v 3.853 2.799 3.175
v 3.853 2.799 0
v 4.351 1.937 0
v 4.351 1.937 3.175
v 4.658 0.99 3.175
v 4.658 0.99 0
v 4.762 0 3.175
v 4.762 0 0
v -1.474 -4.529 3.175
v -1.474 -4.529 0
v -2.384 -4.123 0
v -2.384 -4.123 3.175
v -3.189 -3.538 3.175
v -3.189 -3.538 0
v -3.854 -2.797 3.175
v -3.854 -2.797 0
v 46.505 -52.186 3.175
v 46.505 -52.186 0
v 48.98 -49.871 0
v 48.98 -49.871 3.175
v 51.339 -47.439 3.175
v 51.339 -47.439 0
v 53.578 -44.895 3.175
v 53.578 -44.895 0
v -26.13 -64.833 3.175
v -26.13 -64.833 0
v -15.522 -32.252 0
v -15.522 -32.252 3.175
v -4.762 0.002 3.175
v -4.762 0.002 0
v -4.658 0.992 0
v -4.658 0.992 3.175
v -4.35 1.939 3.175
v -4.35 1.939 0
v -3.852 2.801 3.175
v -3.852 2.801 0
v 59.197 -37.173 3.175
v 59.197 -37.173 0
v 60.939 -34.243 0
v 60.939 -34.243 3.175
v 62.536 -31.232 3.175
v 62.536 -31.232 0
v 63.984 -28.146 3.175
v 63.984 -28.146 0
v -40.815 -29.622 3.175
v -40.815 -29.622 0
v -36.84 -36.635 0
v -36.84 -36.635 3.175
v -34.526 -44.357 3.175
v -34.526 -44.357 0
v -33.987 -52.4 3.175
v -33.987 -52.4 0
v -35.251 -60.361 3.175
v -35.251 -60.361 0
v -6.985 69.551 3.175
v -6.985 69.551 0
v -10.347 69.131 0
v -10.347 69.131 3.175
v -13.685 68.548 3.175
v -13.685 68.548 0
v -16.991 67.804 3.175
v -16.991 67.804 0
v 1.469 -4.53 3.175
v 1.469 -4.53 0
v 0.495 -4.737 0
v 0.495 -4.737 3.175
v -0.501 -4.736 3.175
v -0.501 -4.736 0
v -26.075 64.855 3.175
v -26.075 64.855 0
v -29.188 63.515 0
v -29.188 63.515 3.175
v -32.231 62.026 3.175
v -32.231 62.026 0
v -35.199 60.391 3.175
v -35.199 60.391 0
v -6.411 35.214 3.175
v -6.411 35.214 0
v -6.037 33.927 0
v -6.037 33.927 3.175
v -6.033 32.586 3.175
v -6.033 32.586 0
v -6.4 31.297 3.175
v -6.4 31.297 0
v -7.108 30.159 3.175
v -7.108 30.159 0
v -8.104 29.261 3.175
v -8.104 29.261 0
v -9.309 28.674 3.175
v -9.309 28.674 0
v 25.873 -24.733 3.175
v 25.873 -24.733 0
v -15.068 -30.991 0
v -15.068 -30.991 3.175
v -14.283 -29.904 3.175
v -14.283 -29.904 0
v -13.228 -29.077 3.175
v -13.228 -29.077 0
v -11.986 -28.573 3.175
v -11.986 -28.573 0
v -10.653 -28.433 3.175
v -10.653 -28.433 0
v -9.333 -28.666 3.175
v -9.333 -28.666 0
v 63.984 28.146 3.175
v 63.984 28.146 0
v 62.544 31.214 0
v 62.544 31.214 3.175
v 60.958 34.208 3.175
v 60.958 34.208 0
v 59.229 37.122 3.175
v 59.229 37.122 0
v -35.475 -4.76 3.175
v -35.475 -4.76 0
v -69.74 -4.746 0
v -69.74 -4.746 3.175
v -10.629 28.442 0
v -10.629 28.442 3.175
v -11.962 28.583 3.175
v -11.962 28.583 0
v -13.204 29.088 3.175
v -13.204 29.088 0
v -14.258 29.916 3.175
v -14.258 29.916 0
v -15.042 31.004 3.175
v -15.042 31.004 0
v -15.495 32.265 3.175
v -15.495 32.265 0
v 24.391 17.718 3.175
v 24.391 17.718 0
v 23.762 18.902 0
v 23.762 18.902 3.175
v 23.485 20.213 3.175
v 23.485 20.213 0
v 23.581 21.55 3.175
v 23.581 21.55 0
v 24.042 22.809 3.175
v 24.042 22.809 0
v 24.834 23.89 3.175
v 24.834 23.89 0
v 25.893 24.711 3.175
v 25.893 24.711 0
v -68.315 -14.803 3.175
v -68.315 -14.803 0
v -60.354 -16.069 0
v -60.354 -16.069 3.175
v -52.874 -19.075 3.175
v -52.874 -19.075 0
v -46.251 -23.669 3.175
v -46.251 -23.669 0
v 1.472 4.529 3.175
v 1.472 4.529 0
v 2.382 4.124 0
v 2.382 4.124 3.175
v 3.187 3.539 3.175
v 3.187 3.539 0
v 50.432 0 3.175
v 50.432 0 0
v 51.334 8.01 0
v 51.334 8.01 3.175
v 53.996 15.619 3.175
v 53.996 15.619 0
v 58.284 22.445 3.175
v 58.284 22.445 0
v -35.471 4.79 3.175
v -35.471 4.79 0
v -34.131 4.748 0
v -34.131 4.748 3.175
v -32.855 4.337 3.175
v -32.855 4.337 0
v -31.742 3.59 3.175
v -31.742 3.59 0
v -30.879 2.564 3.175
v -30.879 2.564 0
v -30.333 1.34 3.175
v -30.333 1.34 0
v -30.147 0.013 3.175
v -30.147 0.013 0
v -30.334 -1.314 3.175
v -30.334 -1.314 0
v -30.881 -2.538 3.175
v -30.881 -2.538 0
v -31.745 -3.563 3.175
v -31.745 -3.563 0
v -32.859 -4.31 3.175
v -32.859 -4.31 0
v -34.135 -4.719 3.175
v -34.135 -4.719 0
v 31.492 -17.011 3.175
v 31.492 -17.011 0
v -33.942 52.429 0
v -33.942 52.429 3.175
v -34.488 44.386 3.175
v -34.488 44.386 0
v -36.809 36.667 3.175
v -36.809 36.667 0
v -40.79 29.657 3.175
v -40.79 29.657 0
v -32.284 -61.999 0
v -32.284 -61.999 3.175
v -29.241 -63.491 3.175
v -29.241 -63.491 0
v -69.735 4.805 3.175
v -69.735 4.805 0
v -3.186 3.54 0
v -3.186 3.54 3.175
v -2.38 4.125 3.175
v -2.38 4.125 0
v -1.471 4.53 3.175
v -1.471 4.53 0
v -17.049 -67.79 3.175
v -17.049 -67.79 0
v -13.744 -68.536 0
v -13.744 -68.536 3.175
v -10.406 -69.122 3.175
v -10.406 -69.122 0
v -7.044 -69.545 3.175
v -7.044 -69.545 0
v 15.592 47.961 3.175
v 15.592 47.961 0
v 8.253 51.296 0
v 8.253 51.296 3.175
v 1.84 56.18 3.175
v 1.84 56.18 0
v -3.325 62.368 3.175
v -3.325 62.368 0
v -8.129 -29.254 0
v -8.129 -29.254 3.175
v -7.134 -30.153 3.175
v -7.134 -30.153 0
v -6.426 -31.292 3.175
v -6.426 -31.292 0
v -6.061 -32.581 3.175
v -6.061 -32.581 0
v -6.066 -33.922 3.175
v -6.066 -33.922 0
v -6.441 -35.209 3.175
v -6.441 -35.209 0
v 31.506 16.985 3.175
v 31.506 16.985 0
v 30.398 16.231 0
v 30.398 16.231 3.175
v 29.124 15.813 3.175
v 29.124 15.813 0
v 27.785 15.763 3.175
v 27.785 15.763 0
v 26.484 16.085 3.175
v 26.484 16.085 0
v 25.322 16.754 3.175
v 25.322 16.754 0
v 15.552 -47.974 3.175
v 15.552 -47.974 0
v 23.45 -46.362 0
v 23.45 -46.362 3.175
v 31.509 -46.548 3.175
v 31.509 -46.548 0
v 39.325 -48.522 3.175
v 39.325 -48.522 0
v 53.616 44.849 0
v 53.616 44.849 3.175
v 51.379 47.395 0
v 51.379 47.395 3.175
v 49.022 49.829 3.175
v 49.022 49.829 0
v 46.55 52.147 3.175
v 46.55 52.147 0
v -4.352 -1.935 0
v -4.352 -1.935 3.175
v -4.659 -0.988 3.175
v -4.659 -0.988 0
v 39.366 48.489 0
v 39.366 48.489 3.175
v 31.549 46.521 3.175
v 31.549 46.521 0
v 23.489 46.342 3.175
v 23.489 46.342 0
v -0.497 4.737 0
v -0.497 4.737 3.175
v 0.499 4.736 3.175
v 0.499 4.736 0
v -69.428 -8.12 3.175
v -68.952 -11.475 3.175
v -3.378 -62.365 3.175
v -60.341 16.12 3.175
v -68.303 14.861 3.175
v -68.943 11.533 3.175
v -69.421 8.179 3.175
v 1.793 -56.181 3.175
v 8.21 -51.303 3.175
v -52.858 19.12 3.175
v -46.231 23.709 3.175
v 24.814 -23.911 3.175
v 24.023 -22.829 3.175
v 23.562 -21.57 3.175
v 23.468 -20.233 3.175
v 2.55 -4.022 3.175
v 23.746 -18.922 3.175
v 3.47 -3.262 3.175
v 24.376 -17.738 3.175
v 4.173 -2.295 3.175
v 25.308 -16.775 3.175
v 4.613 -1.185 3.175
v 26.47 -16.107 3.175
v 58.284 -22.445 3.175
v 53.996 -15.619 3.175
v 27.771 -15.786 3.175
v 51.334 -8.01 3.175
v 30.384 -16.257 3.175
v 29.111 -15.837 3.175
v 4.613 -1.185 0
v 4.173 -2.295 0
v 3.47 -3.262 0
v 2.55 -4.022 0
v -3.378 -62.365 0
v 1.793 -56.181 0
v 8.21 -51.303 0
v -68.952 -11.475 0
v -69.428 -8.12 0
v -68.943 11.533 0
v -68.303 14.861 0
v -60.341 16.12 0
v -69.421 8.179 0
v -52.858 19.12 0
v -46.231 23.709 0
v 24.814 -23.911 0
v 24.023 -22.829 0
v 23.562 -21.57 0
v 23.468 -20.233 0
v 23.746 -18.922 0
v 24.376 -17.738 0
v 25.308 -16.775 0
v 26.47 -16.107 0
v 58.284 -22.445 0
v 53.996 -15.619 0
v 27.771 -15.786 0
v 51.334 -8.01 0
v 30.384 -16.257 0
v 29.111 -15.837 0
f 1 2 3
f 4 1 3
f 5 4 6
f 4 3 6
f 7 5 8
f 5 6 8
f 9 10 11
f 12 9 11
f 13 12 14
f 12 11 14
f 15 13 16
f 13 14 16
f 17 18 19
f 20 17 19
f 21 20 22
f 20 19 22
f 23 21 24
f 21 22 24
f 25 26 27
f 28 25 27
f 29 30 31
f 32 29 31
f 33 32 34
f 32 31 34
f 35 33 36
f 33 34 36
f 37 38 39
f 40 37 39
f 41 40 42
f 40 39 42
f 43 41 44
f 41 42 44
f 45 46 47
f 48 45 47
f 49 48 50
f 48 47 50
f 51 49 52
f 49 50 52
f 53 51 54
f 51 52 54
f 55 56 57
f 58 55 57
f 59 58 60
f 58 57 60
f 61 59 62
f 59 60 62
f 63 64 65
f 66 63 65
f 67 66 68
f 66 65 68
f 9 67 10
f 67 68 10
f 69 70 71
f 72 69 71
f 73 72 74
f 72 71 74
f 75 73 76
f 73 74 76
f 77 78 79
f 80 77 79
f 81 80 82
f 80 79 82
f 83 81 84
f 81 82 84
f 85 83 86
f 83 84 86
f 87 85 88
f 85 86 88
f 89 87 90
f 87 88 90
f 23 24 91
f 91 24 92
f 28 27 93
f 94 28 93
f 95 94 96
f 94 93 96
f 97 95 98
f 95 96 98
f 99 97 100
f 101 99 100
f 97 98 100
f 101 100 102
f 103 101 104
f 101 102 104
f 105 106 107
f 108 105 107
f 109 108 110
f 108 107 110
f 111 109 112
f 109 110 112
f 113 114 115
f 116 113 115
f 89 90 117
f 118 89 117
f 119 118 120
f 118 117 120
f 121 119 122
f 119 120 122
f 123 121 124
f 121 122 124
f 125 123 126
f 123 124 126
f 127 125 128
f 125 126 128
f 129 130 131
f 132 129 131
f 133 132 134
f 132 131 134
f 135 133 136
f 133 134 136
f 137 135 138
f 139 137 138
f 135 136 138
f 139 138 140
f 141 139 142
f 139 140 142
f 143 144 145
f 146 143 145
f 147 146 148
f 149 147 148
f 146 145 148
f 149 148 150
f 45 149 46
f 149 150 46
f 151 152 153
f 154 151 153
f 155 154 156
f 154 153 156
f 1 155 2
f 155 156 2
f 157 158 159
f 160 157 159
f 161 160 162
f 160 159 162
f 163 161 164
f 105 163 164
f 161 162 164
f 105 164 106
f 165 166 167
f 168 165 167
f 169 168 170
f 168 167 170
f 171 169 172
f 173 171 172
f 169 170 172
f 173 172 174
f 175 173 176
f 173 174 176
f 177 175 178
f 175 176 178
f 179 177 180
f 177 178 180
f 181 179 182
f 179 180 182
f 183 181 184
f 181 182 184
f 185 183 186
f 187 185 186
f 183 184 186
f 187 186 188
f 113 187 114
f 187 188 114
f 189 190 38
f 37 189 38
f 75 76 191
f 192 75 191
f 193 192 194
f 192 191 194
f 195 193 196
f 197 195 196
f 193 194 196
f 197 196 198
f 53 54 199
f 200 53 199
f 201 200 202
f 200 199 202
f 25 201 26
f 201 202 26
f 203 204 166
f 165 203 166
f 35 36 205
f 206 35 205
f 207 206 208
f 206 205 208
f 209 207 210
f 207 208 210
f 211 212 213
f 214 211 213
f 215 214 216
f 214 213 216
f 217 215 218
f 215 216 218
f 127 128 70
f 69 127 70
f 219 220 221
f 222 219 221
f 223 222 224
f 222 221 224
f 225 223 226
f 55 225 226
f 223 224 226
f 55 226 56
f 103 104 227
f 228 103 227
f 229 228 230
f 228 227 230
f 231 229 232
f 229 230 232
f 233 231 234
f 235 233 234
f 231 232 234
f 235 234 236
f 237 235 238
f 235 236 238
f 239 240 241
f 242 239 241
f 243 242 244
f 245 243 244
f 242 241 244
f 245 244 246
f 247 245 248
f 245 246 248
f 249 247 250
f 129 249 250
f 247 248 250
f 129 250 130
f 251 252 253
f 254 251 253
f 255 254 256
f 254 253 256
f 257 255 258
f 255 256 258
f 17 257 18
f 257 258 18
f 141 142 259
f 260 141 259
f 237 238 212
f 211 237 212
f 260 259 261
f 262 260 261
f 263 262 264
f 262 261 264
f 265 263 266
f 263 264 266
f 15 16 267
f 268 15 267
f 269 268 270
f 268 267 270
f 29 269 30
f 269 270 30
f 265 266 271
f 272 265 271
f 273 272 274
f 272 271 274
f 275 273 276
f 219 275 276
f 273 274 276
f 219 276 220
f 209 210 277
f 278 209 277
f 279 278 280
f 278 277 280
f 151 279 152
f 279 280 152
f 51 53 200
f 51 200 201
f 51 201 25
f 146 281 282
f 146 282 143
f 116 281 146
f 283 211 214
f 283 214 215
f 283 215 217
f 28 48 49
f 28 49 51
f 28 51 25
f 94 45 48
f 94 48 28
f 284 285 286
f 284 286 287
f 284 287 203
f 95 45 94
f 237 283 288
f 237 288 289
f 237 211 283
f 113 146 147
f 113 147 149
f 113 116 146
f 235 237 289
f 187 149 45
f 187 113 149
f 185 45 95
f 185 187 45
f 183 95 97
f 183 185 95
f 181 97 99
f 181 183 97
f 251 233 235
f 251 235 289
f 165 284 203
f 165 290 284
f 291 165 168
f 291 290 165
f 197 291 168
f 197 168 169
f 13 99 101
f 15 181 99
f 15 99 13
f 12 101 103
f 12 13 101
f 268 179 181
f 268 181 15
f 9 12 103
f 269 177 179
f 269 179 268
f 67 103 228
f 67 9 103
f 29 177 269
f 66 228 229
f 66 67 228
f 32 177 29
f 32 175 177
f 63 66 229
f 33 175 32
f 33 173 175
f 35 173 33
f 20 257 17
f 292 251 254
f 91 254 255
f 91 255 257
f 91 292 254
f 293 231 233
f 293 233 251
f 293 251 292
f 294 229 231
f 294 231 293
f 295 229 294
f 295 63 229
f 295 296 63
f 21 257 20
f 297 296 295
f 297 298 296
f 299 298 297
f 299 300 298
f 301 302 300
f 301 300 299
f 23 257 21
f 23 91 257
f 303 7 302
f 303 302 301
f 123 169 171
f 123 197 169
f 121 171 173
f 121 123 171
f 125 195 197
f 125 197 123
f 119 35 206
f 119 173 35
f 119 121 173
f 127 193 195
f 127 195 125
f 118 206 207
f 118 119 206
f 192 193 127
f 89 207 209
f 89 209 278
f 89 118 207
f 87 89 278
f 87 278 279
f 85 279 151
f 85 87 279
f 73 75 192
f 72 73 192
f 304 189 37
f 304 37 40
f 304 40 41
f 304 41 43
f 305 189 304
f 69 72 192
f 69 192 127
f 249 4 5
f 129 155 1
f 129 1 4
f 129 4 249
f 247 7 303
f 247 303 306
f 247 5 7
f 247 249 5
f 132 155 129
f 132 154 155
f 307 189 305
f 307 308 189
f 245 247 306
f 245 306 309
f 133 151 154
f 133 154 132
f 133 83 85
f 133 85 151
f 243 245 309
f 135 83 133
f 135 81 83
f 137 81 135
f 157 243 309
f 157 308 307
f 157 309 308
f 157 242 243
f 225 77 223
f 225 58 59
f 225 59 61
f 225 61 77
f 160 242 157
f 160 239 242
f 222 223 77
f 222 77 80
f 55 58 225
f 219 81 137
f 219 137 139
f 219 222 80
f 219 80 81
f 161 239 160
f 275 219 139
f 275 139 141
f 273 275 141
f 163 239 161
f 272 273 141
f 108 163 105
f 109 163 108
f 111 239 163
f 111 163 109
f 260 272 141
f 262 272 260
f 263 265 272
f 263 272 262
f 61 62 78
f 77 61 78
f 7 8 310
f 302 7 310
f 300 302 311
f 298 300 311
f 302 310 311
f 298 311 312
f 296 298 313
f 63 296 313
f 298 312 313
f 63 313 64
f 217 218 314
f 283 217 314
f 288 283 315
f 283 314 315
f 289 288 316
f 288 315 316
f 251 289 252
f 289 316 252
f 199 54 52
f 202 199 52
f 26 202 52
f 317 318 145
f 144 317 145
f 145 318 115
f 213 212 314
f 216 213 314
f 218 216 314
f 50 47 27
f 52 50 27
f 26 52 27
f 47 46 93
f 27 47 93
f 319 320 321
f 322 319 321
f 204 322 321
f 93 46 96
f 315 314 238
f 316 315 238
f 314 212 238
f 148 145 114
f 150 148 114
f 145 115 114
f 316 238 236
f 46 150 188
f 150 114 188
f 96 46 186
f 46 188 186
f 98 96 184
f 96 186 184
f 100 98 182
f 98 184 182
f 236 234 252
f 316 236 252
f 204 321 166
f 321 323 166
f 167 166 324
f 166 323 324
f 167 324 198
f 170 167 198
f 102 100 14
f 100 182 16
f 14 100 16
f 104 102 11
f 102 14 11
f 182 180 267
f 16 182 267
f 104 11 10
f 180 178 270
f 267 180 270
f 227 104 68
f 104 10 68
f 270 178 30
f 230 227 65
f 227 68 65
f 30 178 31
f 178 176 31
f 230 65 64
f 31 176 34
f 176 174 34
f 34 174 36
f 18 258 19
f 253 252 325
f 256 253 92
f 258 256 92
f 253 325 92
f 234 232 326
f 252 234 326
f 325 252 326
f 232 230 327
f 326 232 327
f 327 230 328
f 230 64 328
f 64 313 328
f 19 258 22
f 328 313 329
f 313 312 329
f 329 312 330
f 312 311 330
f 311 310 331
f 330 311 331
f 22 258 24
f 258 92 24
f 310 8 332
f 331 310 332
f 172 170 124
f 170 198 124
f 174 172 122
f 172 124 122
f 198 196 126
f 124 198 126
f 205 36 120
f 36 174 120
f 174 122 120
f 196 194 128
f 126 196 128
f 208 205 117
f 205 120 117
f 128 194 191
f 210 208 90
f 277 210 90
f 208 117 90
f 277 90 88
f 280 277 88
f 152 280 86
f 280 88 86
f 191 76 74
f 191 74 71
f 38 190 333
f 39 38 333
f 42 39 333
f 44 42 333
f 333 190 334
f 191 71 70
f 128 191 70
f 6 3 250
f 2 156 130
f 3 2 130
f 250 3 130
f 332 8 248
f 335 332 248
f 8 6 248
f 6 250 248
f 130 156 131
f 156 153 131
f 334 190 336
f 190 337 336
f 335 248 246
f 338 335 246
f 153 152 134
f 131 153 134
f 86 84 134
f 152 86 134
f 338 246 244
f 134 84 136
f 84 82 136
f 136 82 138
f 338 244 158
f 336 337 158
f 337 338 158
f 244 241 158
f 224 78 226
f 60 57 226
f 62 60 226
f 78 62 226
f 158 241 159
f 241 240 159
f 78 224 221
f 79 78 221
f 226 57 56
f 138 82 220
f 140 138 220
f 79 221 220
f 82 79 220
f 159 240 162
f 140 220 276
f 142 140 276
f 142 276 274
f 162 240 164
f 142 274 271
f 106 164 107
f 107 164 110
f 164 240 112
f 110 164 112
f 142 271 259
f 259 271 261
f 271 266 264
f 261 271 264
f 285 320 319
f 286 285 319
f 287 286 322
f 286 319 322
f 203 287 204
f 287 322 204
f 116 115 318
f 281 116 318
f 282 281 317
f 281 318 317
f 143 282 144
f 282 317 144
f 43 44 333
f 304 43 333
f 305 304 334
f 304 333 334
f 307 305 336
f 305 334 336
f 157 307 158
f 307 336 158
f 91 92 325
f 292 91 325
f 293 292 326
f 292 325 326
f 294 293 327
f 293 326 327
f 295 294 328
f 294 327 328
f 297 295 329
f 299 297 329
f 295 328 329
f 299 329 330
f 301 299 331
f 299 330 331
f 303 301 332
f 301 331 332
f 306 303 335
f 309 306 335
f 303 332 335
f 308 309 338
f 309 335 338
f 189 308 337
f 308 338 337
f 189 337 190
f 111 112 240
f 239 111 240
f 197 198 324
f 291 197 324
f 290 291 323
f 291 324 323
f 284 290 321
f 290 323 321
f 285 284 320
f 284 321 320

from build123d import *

# Parameters (mm, degrees)
F1_DEPTH = 3.175


# Not quite as in the source:
# - a length typed as a fraction of an inch, garbled in the dataset ("3 / 203.2 mm" for 3/8 in), is restored


with BuildPart() as f1:
    # F0 (on Top) → F1 (new body)
    with BuildSketch(Plane.XY):
        with BuildLine():
            ThreePointArc((-4.7624995714, 0.0020204955), (-4.528844398, 1.4734227733), (-3.8519931198, 2.800634795))
            Line((-3.8519931198, 2.800634795), (-40.7900391434, 29.6568553891))
            ThreePointArc((-40.7900391434, 29.6568553891), (-52.8581727457, 19.1196962374), (-68.3027796686, 14.8610945149))
            ThreePointArc((-68.3027796686, 14.8610945149), (-69.202037382, 9.8589990779), (-69.7354707037, 4.8047857774))
            Line((-69.7354707037, 4.8047857774), (-35.4708737874, 4.7902489857))
            ThreePointArc((-35.4708737874, 4.7902489857), (-31.7421994573, 3.5901618172), (-30.1466961845, 0.012789768))
            Line((-30.1466961845, 0.012789768), (-4.7624995714, 0.0020204955))
        make_face()
        with BuildLine():
            ThreePointArc((-3.8519931198, 2.800634795), (-2.7981829099, 3.853774598), (-1.4705404248, 4.5297811326))
            Line((-1.4705404248, 4.5297811326), (-9.3085437064, 28.6735848558))
            ThreePointArc((-9.3085437064, 28.6735848558), (-13.2035838045, 29.0881739368), (-15.4950023114, 32.2650627762))
            Line((-15.4950023114, 32.2650627762), (-26.0750504874, 64.8553280982))
            ThreePointArc((-26.0750504874, 64.8553280982), (-30.7184565015, 62.789316534), (-35.1994748016, 60.3913802983))
            ThreePointArc((-35.1994748016, 60.3913802983), (-34.4878638746, 44.3862192082), (-40.7900391434, 29.6568553891))
            Line((-40.7900391434, 29.6568553891), (-3.8519931198, 2.800634795))
        make_face()
        with BuildLine():
            ThreePointArc((-1.4705404248, 4.5297811326), (0.0010102478, 4.7624998929), (1.4724620567, 4.5291568466))
            Line((1.4724620567, 4.5291568466), (15.5923915392, 47.9607515681))
            ThreePointArc((15.5923915392, 47.9607515681), (1.8403043285, 56.1797338033), (-6.9847818286, 69.5509501261))
            ThreePointArc((-6.9847818286, 69.5509501261), (-12.0198259563, 68.8596080777), (-16.9913293895, 67.8042518299))
            Line((-16.9913293895, 67.8042518299), (-6.4112812135, 35.213986508))
            ThreePointArc((-6.4112812135, 35.213986508), (-6.3997434798, 31.296961061), (-9.3085437064, 28.6735848558))
            Line((-9.3085437064, 28.6735848558), (-1.4705404248, 4.5297811326))
        make_face()
        with BuildLine():
            ThreePointArc((1.4724620567, 4.5291568466), (2.7998176259, 3.8525871193), (3.8531809453, 2.7990003309))
            Line((3.8531809453, 2.7990003309), (24.390695172, 17.7177155255))
            ThreePointArc((24.390695172, 17.7177155255), (23.5807088667, 21.5500964639), (25.893485986, 24.7114701318))
            Line((25.893485986, 24.7114701318), (53.6158384941, 44.8493445127))
            ThreePointArc((53.6158384941, 44.8493445127), (50.2154123333, 48.626476377), (46.5495312326, 52.1465529318))
            ThreePointArc((46.5495312326, 52.1465529318), (31.5485727352, 46.5213581982), (15.5923915392, 47.9607515681))
            Line((15.5923915392, 47.9607515681), (1.4724620567, 4.5291568466))
        make_face()
        with BuildLine():
            Line((24.390695172, 17.7177155255), (3.8531809453, 2.7990003309))
            ThreePointArc((3.8531809453, 2.7990003309), (4.5294690915, 1.4715012738), (4.7625, 0))
            Line((4.7625, 0), (50.4317, 0))
            ThreePointArc((50.4317, 0), (53.9961373847, 15.6194224529), (63.9836925433, 28.1462063014))
            ThreePointArc((63.9836925433, 28.1462063014), (61.7694966371, 32.7208057029), (59.2287671577, 37.1224323236))
            Line((59.2287671577, 37.1224323236), (31.5064146496, 16.9845579428))
            ThreePointArc((31.5064146496, 16.9845579428), (27.7848747553, 15.7625259109), (24.390695172, 17.7177155255))
        make_face()
        with BuildLine():
            Line((50.4317, 0), (4.7625, 0))
            ThreePointArc((4.7625, 0), (3.8519931198, -2.800634795), (1.4686185281, -4.5304046032))
            Line((1.4686185281, -4.5304046032), (15.5516911338, -47.9739644784))
            ThreePointArc((15.5516911338, -47.9739644784), (31.509087914, -46.5481104778), (46.5052680226, -52.1860315294))
            ThreePointArc((46.5052680226, -52.1860315294), (50.1741345955, -48.6690667492), (53.5777644361, -44.8948215128))
            Line((53.5777644361, -44.8948215128), (25.8725089337, -24.7334319103))
            ThreePointArc((25.8725089337, -24.7334319103), (24.3756528753, -17.7384047006), (31.491991877, -17.0112850838))
            Line((31.491991877, -17.0112850838), (59.1972473794, -37.1726746864))
            ThreePointArc((59.1972473794, -37.1726746864), (61.7556092427, -32.7470085305), (63.9836925433, -28.1462063014))
            ThreePointArc((63.9836925433, -28.1462063014), (53.9961373847, -15.6194224529), (50.4317, 0))
        make_face()
        with BuildLine():
            ThreePointArc((1.4686185281, -4.5304046032), (-0.0030307432, -4.7624990357), (-1.4743834236, -4.5285317455))
            Line((-1.4743834236, -4.5285317455), (-9.3328699489, -28.6656762162))
            ThreePointArc((-9.3328699489, -28.6656762162), (-6.4262967093, -31.2915195998), (-6.4411580428, -35.208533847))
            Line((-6.4411580428, -35.208533847), (-17.0488553147, -67.7898102453))
            ThreePointArc((-17.0488553147, -67.7898102453), (-12.078249143, -68.8493844437), (-7.0437934329, -69.5449984881))
            ThreePointArc((-7.0437934329, -69.5449984881), (1.7926350508, -56.1812750817), (15.5516911338, -47.9739644784))
            Line((15.5516911338, -47.9739644784), (1.4686185281, -4.5304046032))
        make_face()
        with BuildLine():
            ThreePointArc((-1.4743834236, -4.5285317455), (-2.801451838, -3.851398947), (-3.8543680773, -2.797365363))
            Line((-3.8543680773, -2.797365363), (-40.8151883603, -29.6222342844))
            ThreePointArc((-40.8151883603, -29.6222342844), (-34.5255132545, -44.3569402094), (-35.2507043361, -60.3614917348))
            ThreePointArc((-35.2507043361, -60.3614917348), (-30.7717223028, -62.7632292601), (-26.130070975, -64.8331800198))
            Line((-26.130070975, -64.8331800198), (-15.5223737031, -32.2519036214))
            ThreePointArc((-15.5223737031, -32.2519036214), (-13.2282604246, -29.0769601987), (-9.3328699489, -28.6656762162))
            Line((-9.3328699489, -28.6656762162), (-1.4743834236, -4.5285317455))
        make_face()
        with BuildLine():
            ThreePointArc((-3.8543680773, -2.797365363), (-4.5300929698, -1.4695795095), (-4.7624995714, 0.0020204955))
            Line((-4.7624995714, 0.0020204955), (-30.1466961845, 0.012789768))
            ThreePointArc((-30.1466961845, 0.012789768), (-31.7452342902, -3.5632272058), (-35.4749255544, -4.7601501548))
            Line((-35.4749255544, -4.7601501548), (-69.7395224707, -4.7456133631))
            ThreePointArc((-69.7395224707, -4.7456133631), (-69.210377851, -9.8002774634), (-68.3153647492, -14.8031341217))
            ThreePointArc((-68.3153647492, -14.8031341217), (-52.874376818, -19.0748390906), (-40.8151883603, -29.6222342844))
            Line((-40.8151883603, -29.6222342844), (-3.8543680773, -2.797365363))
        make_face()
    extrude(amount=F1_DEPTH)


solid = f1.part
